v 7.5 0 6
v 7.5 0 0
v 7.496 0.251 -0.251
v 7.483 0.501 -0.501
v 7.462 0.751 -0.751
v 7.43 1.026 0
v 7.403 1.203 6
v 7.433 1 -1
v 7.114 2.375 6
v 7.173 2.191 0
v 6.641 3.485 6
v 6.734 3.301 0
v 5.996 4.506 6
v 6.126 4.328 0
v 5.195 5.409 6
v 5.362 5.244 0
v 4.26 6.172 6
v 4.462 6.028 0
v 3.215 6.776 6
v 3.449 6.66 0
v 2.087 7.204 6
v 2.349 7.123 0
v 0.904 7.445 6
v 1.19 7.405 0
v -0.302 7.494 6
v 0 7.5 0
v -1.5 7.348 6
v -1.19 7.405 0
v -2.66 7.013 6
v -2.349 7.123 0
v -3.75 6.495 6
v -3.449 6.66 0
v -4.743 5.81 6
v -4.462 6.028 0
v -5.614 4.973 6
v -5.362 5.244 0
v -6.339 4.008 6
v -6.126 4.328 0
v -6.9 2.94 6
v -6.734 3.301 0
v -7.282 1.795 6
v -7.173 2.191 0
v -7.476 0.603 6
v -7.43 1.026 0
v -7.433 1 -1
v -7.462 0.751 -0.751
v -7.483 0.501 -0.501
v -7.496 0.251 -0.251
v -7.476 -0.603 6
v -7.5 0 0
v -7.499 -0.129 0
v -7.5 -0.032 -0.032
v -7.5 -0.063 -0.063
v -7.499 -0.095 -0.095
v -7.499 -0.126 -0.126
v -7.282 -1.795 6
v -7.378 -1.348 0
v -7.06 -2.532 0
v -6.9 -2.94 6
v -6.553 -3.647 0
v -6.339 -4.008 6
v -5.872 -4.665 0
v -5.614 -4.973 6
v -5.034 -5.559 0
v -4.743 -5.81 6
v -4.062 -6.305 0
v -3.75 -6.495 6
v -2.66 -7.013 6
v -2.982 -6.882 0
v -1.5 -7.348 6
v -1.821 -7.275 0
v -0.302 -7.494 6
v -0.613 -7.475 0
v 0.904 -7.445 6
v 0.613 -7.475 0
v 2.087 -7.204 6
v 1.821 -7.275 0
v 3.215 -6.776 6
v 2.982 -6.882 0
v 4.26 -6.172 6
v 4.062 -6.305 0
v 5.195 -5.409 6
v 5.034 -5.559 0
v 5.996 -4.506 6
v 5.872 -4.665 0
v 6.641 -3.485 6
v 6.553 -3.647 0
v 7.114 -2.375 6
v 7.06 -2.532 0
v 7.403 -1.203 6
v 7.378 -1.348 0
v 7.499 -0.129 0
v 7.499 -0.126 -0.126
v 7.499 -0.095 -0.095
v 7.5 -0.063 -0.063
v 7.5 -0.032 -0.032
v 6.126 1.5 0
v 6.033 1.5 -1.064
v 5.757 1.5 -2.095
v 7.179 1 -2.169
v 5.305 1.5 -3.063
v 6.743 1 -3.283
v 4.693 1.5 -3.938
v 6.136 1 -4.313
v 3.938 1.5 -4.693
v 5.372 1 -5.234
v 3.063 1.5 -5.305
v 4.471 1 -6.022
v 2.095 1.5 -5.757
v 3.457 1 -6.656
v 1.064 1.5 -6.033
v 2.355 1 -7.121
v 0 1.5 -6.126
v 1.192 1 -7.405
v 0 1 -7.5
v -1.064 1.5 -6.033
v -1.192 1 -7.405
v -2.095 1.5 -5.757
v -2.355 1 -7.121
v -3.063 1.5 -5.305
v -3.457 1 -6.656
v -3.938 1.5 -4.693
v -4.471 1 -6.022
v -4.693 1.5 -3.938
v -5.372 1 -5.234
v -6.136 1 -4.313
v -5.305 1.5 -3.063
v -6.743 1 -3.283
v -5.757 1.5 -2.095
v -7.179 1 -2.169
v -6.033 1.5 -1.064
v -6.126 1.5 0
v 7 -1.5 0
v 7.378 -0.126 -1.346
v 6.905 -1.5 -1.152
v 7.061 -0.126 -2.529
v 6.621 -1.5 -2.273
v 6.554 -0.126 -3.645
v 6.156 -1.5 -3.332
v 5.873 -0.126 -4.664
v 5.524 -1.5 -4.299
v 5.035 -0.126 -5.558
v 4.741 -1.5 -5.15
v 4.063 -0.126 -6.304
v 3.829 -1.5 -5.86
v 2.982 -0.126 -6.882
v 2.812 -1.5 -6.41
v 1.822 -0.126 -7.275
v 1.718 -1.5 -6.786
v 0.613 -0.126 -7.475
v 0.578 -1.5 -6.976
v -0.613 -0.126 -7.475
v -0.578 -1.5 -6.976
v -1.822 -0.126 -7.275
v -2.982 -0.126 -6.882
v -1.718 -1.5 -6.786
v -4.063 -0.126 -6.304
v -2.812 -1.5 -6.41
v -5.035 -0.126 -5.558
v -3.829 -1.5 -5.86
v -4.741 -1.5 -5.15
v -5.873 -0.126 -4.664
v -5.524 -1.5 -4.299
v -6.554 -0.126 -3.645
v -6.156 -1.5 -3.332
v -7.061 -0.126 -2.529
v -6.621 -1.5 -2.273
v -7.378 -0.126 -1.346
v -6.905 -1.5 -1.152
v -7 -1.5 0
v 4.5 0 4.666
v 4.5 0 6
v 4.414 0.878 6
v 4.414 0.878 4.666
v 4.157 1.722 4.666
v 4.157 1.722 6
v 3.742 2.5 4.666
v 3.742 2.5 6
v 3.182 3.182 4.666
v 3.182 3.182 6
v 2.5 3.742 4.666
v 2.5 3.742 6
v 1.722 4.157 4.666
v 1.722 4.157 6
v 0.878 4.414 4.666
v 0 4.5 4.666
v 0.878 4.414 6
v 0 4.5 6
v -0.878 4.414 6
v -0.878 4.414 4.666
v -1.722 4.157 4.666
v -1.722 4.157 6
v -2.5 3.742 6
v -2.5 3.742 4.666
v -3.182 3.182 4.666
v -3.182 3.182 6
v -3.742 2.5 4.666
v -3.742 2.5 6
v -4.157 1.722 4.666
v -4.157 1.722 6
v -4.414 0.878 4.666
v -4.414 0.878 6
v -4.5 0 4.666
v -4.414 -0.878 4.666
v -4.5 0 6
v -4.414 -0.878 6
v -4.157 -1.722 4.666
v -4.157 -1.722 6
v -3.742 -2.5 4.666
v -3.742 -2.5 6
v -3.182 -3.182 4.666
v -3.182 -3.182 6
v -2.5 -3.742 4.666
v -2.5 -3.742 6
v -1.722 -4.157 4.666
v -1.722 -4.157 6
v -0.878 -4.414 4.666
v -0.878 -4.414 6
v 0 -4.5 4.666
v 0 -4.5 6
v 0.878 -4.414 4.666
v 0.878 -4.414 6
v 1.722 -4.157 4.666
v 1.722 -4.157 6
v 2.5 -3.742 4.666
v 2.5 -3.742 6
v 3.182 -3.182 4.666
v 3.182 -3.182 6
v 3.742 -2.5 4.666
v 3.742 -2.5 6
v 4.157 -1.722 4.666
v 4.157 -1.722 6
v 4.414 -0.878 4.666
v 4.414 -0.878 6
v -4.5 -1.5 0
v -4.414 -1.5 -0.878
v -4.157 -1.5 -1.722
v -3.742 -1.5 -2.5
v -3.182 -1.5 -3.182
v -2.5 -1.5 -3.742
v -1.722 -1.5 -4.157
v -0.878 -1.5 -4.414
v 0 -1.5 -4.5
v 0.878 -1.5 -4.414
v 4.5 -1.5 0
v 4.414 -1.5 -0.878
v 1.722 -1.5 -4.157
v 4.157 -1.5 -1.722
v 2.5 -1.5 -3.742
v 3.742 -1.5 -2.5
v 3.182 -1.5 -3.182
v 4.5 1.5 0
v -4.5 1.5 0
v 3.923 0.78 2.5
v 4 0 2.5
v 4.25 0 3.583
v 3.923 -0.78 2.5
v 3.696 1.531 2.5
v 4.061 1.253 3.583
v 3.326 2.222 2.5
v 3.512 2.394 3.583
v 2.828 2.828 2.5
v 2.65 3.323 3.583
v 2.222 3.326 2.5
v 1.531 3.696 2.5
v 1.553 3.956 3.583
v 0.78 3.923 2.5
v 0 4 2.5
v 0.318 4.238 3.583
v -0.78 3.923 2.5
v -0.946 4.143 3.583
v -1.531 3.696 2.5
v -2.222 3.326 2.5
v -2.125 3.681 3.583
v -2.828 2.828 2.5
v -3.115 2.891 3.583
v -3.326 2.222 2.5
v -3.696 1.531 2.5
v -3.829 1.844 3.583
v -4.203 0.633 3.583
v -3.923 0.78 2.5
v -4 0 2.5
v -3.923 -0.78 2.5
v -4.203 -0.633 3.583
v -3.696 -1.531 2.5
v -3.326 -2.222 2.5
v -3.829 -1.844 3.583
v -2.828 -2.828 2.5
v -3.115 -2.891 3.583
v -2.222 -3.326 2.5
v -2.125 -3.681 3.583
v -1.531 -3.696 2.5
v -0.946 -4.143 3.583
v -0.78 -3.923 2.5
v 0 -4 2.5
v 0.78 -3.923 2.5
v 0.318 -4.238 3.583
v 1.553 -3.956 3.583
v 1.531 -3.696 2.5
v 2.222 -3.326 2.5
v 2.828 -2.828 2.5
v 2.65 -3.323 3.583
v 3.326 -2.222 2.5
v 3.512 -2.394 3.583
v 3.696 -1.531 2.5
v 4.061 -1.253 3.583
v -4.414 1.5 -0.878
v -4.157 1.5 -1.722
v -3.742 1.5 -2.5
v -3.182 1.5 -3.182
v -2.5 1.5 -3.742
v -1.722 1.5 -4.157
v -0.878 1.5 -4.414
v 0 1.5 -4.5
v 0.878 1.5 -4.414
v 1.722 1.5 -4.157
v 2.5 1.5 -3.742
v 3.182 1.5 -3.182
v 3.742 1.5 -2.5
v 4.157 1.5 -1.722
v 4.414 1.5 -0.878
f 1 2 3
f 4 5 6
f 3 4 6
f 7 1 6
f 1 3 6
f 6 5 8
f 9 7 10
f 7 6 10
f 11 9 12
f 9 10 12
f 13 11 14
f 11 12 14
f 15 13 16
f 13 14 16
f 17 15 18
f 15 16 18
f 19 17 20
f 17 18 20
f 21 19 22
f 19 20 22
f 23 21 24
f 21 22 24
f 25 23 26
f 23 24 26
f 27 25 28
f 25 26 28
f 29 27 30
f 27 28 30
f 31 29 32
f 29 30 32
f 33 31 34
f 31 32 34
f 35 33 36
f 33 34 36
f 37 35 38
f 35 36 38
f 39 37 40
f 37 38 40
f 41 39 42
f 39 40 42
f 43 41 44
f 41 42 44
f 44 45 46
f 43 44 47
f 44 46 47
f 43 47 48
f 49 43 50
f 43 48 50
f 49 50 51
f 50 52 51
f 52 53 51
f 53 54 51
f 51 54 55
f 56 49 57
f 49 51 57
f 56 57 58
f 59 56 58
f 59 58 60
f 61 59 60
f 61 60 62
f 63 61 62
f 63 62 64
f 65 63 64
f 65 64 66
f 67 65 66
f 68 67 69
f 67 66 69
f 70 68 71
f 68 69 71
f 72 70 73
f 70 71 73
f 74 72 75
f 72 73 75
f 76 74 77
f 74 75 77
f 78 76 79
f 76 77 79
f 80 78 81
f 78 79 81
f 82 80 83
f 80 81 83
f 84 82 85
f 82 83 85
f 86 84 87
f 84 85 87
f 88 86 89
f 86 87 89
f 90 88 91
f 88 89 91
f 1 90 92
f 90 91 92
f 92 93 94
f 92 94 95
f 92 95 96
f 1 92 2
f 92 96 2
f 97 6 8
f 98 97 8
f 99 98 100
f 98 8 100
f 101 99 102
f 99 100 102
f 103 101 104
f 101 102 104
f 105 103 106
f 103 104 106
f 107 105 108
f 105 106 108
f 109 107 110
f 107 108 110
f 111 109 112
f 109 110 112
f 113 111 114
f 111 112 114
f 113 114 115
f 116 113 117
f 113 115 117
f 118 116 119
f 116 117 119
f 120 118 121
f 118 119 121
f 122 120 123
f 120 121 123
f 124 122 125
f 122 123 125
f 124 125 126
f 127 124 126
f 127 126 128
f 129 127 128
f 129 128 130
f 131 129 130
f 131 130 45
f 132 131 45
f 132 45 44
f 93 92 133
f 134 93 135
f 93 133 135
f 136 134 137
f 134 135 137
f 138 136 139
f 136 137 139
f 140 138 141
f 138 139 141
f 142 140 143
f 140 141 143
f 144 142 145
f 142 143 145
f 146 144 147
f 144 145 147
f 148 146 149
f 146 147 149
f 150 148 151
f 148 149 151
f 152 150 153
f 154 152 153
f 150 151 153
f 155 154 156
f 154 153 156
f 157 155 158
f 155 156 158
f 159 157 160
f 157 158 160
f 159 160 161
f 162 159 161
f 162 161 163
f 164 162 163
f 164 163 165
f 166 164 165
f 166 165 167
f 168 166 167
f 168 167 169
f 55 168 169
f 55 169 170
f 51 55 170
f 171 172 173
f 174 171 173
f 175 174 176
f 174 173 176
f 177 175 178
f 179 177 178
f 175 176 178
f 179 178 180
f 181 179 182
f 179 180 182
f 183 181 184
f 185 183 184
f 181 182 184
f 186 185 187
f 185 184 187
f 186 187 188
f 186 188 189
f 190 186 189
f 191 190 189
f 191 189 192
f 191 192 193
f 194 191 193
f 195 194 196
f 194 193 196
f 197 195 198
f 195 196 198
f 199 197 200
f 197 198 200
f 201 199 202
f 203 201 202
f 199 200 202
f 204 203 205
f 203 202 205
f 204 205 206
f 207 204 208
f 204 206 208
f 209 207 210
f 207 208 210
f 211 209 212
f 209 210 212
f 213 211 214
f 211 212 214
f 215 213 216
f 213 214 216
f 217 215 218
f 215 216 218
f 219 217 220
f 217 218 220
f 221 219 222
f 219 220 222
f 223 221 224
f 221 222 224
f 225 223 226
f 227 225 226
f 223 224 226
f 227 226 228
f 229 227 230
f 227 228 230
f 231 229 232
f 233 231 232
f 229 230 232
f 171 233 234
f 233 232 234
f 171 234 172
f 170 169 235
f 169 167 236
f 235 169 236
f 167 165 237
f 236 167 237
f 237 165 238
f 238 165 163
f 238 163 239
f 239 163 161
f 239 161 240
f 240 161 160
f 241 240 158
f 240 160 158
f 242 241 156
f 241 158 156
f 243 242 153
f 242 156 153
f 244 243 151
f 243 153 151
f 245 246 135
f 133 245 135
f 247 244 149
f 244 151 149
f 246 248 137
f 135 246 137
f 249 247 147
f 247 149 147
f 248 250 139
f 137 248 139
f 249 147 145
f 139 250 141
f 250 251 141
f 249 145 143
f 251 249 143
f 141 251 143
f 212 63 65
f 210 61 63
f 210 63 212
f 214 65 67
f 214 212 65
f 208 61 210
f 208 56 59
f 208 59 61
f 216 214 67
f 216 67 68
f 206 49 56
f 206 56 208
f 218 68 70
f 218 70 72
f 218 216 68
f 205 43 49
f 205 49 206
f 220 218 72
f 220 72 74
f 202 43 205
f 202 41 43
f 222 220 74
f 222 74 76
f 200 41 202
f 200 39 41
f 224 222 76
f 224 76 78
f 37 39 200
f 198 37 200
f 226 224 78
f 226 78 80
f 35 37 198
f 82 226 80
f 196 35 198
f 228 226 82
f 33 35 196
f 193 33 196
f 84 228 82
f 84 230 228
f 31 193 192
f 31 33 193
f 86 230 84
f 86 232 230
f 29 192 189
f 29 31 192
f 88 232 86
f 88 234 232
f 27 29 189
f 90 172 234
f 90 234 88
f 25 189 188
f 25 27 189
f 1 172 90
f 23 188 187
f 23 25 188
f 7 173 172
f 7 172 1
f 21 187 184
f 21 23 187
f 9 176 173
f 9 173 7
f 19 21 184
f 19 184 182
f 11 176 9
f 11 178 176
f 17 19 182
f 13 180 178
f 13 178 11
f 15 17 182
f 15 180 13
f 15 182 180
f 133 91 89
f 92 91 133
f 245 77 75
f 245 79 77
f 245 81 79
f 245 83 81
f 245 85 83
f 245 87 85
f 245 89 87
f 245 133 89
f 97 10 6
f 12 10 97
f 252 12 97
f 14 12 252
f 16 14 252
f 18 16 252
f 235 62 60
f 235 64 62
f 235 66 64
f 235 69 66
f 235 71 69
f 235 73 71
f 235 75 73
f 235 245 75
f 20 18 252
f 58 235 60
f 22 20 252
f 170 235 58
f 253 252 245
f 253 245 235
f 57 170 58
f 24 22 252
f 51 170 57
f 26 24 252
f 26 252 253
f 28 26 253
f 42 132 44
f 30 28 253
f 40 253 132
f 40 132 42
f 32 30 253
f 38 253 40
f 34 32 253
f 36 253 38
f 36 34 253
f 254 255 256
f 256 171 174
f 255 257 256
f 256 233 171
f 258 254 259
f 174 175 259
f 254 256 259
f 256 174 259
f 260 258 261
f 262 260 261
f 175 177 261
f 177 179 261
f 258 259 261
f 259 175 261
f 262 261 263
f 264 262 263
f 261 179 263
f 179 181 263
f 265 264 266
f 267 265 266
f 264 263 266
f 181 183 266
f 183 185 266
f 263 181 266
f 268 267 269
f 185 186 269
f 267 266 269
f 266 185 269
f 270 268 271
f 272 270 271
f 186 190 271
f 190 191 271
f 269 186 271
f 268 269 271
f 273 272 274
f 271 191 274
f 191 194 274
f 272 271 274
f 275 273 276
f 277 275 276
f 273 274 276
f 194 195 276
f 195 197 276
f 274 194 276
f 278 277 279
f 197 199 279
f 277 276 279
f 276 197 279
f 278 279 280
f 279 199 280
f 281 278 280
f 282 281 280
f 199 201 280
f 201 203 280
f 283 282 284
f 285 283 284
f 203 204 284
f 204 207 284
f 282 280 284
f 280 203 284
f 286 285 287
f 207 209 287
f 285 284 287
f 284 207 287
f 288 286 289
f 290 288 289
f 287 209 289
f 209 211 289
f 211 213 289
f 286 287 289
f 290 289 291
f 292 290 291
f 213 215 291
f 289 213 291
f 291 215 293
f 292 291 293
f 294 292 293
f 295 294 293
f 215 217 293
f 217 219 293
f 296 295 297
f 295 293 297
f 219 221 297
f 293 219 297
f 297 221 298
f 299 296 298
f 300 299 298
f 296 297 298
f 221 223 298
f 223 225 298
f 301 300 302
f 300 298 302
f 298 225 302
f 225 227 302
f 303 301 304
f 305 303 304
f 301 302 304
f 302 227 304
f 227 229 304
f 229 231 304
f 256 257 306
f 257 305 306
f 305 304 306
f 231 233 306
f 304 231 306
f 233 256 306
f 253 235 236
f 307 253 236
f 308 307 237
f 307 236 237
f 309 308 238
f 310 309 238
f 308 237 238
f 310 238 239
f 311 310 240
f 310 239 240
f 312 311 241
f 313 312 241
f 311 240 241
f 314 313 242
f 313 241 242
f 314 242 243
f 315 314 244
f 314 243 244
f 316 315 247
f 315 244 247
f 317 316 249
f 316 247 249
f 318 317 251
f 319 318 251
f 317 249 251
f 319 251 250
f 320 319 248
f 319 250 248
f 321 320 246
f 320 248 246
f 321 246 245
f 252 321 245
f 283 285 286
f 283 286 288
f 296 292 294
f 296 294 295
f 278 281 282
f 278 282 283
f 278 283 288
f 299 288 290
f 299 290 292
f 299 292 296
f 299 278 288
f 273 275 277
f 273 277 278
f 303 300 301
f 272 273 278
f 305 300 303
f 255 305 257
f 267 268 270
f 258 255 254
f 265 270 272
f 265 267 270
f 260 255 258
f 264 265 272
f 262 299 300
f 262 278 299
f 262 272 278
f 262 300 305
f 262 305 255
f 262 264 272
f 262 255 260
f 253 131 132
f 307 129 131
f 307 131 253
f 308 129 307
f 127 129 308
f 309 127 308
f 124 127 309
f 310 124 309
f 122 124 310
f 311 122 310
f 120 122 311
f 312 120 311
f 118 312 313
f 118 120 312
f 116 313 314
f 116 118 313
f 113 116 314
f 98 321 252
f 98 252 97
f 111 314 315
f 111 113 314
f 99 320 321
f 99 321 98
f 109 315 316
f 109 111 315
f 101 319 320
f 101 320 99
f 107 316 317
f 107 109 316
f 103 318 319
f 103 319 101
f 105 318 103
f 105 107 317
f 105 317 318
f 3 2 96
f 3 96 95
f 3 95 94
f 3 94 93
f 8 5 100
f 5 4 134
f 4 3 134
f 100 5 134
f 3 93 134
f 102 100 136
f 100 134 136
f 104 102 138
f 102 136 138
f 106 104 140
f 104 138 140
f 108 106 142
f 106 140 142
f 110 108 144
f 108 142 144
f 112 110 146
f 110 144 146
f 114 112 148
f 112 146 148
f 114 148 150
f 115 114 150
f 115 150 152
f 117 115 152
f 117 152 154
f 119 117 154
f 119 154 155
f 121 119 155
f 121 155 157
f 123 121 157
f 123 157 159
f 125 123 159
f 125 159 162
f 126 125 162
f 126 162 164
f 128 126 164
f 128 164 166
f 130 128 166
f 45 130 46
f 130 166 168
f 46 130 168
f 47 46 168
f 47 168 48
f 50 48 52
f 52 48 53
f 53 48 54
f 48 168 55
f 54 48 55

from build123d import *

# Parameters (mm, degrees)
SKETCH1_R                = 7.5
BOSS_EXTRUDE1_DEPTH      = 6
SKETCH2_R                = 4.5
CUT_EXTRUDE1_DEPTH       = 3.5
CHAMFER1_SIZE            = 0.5
CHAMFER1_SIZE2           = 2.165737937
BOSS_EXTRUDE2_DEPTH      = 1.5
BOSS_EXTRUDE2_DEPTH_BACK = 1.5
SKETCH4_OUTSIDE_W        = 22.028
SKETCH4_OUTSIDE_H        = 22.028
SKETCH4_OUTSIDE_R        = 7.5
CUT_EXTRUDE2_DEPTH       = 13.990381057
CHAMFER3_SIZE            = 1.37373871
CHAMFER3_SIZE_2          = 0.5


with BuildPart() as part:
    # Sketch1 → Boss-Extrude1 (new body)
    with BuildSketch(Plane.XY):
        Circle(SKETCH1_R)
    extrude(amount=BOSS_EXTRUDE1_DEPTH)

    # Sketch2 → Cut-Extrude1 (cut)
    with BuildSketch(Plane.XY.offset(6)):
        Circle(SKETCH2_R)
    extrude(amount=-CUT_EXTRUDE1_DEPTH, mode=Mode.SUBTRACT)

    # Chamfer1
    chamfer1_edges = [part.edges().sort_by_distance(p)[0] for p in [
        (-4.5, 0, 2.5),
    ]]
    chamfer1_side = [part.faces().sort_by_distance(p)[0] for p in [
        (0, 0, 2.5),
    ]]
    chamfer(chamfer1_edges, length=CHAMFER1_SIZE, length2=CHAMFER1_SIZE2, reference=chamfer1_side[0])

    # Sketch3 → Boss-Extrude2 (add, two sides: drawn at the far end of the back side and taken through both)
    with BuildSketch(Plane(origin=(0, 0, 0), x_dir=(1, 0, 0), z_dir=(0, 1, 0)).offset(-BOSS_EXTRUDE2_DEPTH_BACK)):
        with BuildLine():
            Line((-7.5, 0), (-4.5, 0))
            ThreePointArc((-4.5, 0), (0, 4.5), (4.5, 0))
            Line((4.5, 0), (7.5, 0))
            ThreePointArc((7.5, 0), (0, 7.5), (-7.5, 0))
        make_face()
    extrude(amount=BOSS_EXTRUDE2_DEPTH + BOSS_EXTRUDE2_DEPTH_BACK)

    # Sketch4 outside → Cut-Extrude2 (cut, through all)
    with BuildSketch(Plane.XY):
        Rectangle(SKETCH4_OUTSIDE_W, SKETCH4_OUTSIDE_H)
        Circle(SKETCH4_OUTSIDE_R, mode=Mode.SUBTRACT)
    extrude(amount=-CUT_EXTRUDE2_DEPTH, mode=Mode.SUBTRACT)

    # Chamfer3
    # the kernel refuses this chamfer: 1.37373871, 0.5 mm, written as the material it takes off along each edge
    with BuildSketch(Plane(origin=(0, -1.5, 0), x_dir=(0.9625909817516988, 0, 0.27095867184923395), z_dir=(-0.27095867184923395, 0, 0.9625909817516988))) as chamfer3_piece_1_section:
        Polygon((7.5, CHAMFER3_SIZE), (7.5 - CHAMFER3_SIZE_2, 0), (7.5, 0), align=None)
    chamfer3_piece_1 = revolve(axis=Axis((0, -1.5, 0), (0, 1, 0)), revolution_arc=211.442642735, mode=Mode.PRIVATE)
    chamfer3_piece_1 = split(chamfer3_piece_1, bisect_by=Plane(origin=(0, -0.82033622, 0), z_dir=(0, 0, -1)), keep=Keep.TOP, mode=Mode.PRIVATE)
    add(chamfer3_piece_1, mode=Mode.SUBTRACT)
    with BuildSketch(Plane(origin=(0, 1.5, 0), x_dir=(0.9625909817516987, 0, 0.2709586718492343), z_dir=(-0.2709586718492343, 0, 0.9625909817516987))) as chamfer3_piece_2_section:
        Polygon((7.5 - CHAMFER3_SIZE, 0), (7.5, -CHAMFER3_SIZE_2), (7.5, 0), align=None)
    chamfer3_piece_2 = revolve(axis=Axis((0, 1.5, 0), (0, 1, 0)), revolution_arc=211.442642735, mode=Mode.PRIVATE)
    chamfer3_piece_2 = split(chamfer3_piece_2, bisect_by=Plane(origin=(0, 1.269508832, 0), z_dir=(0, 0, -1)), keep=Keep.TOP, mode=Mode.PRIVATE)
    add(chamfer3_piece_2, mode=Mode.SUBTRACT)


solid = part.part
